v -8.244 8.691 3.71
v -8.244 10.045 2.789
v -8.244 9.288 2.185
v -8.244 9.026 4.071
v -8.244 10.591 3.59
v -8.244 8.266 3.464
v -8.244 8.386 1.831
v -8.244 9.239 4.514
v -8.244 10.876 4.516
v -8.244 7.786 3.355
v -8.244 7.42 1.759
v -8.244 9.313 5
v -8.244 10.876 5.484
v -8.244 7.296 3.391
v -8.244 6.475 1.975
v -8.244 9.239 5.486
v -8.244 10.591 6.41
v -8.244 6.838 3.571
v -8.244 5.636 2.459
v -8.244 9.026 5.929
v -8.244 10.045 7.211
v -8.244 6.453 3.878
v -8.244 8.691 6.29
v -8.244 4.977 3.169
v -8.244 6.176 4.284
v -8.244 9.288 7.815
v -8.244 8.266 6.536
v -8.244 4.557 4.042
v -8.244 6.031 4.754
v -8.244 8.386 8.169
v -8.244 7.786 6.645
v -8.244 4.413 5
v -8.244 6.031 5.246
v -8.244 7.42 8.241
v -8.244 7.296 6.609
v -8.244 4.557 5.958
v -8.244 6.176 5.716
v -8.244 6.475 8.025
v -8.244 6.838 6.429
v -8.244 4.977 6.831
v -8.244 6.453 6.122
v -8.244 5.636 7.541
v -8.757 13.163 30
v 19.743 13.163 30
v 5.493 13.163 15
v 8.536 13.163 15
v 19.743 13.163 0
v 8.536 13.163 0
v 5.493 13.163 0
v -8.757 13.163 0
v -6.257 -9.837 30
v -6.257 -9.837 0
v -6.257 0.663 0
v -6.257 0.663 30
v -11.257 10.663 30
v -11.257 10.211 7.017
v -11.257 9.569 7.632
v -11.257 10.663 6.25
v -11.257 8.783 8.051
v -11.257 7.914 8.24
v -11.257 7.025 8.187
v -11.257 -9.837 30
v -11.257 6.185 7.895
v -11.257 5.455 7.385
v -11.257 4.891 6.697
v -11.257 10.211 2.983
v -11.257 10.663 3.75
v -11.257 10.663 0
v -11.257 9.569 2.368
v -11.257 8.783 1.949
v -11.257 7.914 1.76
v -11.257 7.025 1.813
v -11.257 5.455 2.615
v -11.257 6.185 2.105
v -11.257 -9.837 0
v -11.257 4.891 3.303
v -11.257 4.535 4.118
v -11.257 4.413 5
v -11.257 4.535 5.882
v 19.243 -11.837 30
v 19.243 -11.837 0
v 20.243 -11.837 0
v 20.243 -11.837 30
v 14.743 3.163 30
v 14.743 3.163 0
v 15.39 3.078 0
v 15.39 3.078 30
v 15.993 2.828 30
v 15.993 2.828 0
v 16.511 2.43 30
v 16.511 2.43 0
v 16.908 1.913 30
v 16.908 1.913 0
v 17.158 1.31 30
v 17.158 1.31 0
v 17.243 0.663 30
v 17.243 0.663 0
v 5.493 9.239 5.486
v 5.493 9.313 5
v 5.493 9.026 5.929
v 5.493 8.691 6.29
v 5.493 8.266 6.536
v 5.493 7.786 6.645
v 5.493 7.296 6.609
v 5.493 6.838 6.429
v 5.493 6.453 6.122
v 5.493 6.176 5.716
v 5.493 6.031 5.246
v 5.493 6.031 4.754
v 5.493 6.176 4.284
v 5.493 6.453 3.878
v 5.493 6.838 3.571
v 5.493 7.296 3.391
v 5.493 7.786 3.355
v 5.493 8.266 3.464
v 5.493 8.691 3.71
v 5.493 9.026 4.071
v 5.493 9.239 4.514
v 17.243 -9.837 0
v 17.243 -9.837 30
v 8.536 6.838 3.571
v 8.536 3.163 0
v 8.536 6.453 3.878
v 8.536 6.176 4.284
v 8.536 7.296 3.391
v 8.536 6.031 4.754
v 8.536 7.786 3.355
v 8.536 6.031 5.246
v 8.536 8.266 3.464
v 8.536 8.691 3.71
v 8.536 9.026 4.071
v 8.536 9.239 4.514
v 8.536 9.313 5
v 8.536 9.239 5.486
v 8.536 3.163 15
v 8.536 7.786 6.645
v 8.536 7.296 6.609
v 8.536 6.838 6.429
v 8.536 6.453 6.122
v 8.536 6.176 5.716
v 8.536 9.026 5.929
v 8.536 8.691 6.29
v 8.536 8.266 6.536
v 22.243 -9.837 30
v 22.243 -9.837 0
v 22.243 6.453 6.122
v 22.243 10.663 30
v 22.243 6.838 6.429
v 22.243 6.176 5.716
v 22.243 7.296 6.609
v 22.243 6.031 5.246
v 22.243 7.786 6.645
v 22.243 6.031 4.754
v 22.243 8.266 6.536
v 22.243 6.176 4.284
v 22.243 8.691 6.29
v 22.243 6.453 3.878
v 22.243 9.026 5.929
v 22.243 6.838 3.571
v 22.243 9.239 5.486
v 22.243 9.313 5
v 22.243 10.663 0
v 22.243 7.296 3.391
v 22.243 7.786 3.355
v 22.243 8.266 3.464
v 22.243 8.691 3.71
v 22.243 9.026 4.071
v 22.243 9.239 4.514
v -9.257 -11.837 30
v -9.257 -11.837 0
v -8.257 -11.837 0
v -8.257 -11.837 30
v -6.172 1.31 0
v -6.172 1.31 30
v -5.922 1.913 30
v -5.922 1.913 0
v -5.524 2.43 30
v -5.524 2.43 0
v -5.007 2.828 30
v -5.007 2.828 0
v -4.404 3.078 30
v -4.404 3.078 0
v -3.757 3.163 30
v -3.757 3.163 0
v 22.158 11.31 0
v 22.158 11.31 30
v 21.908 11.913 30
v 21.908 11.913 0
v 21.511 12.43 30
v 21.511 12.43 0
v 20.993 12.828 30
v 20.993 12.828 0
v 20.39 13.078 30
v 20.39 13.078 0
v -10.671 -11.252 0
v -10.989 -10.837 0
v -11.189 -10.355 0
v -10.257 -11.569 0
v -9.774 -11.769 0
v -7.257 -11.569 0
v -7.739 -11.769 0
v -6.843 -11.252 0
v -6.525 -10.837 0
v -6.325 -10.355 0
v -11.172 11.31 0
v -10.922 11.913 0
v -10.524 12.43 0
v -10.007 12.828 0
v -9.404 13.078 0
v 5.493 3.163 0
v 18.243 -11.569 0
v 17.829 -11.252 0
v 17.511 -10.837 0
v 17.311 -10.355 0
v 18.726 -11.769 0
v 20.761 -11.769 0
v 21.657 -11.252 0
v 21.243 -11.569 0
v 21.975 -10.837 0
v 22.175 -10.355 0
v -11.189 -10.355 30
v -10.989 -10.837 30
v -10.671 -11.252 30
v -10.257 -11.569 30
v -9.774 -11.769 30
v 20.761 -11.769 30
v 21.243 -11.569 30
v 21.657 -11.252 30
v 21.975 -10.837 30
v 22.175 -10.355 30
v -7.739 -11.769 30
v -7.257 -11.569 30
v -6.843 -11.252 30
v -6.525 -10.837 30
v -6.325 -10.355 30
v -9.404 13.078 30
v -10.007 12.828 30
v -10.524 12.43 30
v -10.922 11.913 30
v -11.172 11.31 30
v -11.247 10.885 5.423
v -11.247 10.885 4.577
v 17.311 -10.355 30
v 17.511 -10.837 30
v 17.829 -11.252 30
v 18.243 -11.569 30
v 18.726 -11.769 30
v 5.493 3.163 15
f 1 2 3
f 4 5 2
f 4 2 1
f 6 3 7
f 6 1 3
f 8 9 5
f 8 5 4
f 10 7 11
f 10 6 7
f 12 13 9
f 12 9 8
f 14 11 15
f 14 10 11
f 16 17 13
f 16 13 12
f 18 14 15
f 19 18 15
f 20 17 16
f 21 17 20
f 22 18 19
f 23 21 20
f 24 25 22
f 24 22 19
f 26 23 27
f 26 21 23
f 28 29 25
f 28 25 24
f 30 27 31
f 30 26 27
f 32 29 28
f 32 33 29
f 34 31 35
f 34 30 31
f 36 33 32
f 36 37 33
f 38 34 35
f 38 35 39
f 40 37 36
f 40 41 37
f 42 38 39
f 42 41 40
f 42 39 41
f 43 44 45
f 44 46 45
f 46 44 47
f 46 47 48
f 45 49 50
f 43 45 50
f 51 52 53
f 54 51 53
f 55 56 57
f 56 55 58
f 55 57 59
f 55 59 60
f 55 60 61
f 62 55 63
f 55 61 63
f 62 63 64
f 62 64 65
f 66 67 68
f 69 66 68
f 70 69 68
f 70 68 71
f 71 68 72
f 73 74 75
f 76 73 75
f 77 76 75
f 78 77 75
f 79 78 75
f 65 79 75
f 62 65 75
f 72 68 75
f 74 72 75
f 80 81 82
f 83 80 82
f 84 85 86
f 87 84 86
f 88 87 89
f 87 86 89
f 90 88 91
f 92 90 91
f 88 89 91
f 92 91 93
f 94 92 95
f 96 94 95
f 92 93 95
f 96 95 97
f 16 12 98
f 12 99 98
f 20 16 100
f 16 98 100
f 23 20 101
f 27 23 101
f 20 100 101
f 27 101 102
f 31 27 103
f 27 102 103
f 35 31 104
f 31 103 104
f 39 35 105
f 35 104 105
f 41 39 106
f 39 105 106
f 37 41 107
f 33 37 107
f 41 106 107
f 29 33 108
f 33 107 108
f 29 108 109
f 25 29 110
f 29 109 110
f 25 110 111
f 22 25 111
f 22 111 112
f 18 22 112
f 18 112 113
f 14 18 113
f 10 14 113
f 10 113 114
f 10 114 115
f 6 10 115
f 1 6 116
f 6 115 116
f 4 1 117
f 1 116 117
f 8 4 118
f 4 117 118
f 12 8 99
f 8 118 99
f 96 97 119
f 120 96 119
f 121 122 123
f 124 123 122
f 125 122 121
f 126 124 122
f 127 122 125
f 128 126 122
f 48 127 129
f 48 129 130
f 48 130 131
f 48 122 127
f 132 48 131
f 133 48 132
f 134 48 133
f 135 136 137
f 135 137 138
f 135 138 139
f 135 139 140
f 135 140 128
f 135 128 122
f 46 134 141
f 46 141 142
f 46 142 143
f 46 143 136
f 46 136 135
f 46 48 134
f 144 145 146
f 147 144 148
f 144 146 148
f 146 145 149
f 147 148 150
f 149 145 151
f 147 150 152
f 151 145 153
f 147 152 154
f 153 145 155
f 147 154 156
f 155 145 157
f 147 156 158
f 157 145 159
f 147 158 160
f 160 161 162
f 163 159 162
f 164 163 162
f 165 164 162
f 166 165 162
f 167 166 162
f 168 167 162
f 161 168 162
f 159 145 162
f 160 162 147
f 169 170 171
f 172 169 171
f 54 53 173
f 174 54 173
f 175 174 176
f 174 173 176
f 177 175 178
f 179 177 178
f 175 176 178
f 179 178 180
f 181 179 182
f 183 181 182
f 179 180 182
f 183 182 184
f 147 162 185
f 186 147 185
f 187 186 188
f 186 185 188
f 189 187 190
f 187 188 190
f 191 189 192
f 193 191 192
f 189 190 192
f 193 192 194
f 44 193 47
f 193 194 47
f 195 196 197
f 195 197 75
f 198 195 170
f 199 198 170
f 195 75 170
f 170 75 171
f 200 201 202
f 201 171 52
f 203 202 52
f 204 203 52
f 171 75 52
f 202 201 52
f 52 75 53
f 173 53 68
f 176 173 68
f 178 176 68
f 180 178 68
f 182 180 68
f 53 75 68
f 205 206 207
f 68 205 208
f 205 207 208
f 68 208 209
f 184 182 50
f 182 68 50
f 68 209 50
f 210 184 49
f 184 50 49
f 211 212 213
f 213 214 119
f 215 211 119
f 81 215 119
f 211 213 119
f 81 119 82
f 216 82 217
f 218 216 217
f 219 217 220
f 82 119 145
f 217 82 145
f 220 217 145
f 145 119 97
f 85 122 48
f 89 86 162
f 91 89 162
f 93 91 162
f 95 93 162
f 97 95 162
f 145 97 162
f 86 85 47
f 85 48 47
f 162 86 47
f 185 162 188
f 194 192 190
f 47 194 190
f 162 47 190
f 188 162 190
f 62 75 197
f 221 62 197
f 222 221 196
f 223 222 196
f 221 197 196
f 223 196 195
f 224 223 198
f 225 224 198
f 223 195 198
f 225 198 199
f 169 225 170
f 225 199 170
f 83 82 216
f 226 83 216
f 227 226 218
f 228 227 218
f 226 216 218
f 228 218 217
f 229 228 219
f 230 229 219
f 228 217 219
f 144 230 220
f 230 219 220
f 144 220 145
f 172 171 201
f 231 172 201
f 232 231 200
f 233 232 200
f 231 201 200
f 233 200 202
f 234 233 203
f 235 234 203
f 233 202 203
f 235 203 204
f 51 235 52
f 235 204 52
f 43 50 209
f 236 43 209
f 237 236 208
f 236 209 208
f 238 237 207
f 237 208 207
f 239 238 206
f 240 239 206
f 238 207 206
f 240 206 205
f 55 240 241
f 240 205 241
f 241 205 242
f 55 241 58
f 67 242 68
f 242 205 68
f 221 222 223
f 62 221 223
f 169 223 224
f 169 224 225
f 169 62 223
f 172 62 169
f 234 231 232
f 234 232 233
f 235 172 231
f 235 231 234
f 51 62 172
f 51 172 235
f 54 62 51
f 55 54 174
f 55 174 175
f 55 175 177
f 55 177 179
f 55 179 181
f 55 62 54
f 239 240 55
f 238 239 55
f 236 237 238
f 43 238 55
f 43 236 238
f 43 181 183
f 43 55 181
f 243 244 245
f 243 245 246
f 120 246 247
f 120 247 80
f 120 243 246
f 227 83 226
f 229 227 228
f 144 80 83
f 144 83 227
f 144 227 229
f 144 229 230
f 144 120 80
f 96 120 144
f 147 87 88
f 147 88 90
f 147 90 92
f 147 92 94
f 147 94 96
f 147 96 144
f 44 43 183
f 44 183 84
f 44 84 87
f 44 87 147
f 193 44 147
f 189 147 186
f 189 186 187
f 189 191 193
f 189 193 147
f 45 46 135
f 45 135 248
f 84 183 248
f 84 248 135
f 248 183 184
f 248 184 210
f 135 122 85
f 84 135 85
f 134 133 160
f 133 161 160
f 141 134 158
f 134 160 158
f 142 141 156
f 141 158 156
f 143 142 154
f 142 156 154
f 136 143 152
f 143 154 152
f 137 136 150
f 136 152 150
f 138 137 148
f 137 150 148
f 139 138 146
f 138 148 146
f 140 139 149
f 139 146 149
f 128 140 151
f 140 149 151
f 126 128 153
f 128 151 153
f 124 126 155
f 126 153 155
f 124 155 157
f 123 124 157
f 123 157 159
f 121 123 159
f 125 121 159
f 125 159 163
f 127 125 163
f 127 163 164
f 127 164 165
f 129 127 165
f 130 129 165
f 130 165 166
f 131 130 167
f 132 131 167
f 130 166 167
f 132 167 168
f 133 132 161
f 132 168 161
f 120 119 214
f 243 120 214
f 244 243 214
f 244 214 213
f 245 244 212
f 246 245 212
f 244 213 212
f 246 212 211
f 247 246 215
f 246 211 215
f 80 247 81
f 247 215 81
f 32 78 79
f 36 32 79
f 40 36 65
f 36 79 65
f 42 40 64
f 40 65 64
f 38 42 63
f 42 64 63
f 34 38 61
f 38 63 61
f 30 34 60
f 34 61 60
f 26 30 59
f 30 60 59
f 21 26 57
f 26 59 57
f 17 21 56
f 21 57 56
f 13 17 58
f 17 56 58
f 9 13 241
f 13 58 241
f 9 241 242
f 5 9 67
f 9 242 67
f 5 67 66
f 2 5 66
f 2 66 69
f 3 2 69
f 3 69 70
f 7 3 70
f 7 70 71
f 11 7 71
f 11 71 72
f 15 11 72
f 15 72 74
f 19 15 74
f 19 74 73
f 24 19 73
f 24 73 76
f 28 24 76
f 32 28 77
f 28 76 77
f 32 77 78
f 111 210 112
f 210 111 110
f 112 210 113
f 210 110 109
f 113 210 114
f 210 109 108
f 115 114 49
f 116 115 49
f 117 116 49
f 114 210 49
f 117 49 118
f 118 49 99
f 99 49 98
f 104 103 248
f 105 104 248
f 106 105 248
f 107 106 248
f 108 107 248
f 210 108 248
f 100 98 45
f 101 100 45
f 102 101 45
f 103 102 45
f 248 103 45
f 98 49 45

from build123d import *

# Parameters (mm, degrees)
F1_DEPTH       = 30
F2_W           = 3.0429003396
F2_H           = 15
F3_DEPTH       = 25.001
F5_D           = 3.3
F5_START       = 0.0125315
F5_CBORE_D     = 6.5
F5_CBORE_DEPTH = 3


with BuildPart() as f1:
    # F0 (on Top) → F1 (new body)
    with BuildSketch(Plane.XY):
        with BuildLine():
            ThreePointArc((-11.2567170643, -9.8372937679), (-10.6709306267, -11.2515073303), (-9.2567170643, -11.8372937679))
            Line((-9.2567170643, -11.8372937679), (-8.2567170643, -11.8372937679))
            ThreePointArc((-8.2567170643, -11.8372937679), (-6.8425035019, -11.2515073303), (-6.2567170643, -9.8372937679))
            Line((-6.2567170643, -9.8372937679), (-6.2567170643, 0.6627062321))
            ThreePointArc((-6.2567170643, 0.6627062321), (-5.5244840173, 2.430473185), (-3.7567170643, 3.1627062321))
            Line((-3.7567170643, 3.1627062321), (14.7432829357, 3.1627062321))
            ThreePointArc((14.7432829357, 3.1627062321), (16.5110498887, 2.430473185), (17.2432829357, 0.6627062321))
            Line((17.2432829357, 0.6627062321), (17.2432829357, -9.8372937679))
            ThreePointArc((17.2432829357, -9.8372937679), (17.8290693733, -11.2515073303), (19.2432829357, -11.8372937679))
            Line((19.2432829357, -11.8372937679), (20.2432829357, -11.8372937679))
            ThreePointArc((20.2432829357, -11.8372937679), (21.6574964981, -11.2515073303), (22.2432829357, -9.8372937679))
            Line((22.2432829357, -9.8372937679), (22.2432829357, 10.6627062321))
            ThreePointArc((22.2432829357, 10.6627062321), (21.5110498887, 12.430473185), (19.7432829357, 13.1627062321))
            Line((19.7432829357, 13.1627062321), (-8.7567170643, 13.1627062321))
            ThreePointArc((-8.7567170643, 13.1627062321), (-10.5244840173, 12.430473185), (-11.2567170643, 10.6627062321))
            Line((-11.2567170643, 10.6627062321), (-11.2567170643, -9.8372937679))
        make_face()
    extrude(amount=F1_DEPTH)

    # F2 (on face) → F3 (cut, through all)
    with BuildSketch(Plane(origin=(0, 13.1627062321, 0), x_dir=(-1, 0, 0), z_dir=(0, 1, 0))):
        with Locations((-7.0147331055, 7.5)):
            Rectangle(F2_W, F2_H)
    extrude(amount=-F3_DEPTH, mode=Mode.SUBTRACT)

    # F5 (through all)
    # its depths count from where the whole tool has entered the part; down to there all is cleared
    with Locations(Plane(origin=(-11.2567170643, 0, 0), x_dir=(0, -1, 0), z_dir=(-1, 0, 0)).offset(-F5_START)):
        with Locations((-7.6627062321, 5)):
            CounterBoreHole(F5_D / 2, F5_CBORE_D / 2, F5_CBORE_DEPTH)


solid = f1.part
